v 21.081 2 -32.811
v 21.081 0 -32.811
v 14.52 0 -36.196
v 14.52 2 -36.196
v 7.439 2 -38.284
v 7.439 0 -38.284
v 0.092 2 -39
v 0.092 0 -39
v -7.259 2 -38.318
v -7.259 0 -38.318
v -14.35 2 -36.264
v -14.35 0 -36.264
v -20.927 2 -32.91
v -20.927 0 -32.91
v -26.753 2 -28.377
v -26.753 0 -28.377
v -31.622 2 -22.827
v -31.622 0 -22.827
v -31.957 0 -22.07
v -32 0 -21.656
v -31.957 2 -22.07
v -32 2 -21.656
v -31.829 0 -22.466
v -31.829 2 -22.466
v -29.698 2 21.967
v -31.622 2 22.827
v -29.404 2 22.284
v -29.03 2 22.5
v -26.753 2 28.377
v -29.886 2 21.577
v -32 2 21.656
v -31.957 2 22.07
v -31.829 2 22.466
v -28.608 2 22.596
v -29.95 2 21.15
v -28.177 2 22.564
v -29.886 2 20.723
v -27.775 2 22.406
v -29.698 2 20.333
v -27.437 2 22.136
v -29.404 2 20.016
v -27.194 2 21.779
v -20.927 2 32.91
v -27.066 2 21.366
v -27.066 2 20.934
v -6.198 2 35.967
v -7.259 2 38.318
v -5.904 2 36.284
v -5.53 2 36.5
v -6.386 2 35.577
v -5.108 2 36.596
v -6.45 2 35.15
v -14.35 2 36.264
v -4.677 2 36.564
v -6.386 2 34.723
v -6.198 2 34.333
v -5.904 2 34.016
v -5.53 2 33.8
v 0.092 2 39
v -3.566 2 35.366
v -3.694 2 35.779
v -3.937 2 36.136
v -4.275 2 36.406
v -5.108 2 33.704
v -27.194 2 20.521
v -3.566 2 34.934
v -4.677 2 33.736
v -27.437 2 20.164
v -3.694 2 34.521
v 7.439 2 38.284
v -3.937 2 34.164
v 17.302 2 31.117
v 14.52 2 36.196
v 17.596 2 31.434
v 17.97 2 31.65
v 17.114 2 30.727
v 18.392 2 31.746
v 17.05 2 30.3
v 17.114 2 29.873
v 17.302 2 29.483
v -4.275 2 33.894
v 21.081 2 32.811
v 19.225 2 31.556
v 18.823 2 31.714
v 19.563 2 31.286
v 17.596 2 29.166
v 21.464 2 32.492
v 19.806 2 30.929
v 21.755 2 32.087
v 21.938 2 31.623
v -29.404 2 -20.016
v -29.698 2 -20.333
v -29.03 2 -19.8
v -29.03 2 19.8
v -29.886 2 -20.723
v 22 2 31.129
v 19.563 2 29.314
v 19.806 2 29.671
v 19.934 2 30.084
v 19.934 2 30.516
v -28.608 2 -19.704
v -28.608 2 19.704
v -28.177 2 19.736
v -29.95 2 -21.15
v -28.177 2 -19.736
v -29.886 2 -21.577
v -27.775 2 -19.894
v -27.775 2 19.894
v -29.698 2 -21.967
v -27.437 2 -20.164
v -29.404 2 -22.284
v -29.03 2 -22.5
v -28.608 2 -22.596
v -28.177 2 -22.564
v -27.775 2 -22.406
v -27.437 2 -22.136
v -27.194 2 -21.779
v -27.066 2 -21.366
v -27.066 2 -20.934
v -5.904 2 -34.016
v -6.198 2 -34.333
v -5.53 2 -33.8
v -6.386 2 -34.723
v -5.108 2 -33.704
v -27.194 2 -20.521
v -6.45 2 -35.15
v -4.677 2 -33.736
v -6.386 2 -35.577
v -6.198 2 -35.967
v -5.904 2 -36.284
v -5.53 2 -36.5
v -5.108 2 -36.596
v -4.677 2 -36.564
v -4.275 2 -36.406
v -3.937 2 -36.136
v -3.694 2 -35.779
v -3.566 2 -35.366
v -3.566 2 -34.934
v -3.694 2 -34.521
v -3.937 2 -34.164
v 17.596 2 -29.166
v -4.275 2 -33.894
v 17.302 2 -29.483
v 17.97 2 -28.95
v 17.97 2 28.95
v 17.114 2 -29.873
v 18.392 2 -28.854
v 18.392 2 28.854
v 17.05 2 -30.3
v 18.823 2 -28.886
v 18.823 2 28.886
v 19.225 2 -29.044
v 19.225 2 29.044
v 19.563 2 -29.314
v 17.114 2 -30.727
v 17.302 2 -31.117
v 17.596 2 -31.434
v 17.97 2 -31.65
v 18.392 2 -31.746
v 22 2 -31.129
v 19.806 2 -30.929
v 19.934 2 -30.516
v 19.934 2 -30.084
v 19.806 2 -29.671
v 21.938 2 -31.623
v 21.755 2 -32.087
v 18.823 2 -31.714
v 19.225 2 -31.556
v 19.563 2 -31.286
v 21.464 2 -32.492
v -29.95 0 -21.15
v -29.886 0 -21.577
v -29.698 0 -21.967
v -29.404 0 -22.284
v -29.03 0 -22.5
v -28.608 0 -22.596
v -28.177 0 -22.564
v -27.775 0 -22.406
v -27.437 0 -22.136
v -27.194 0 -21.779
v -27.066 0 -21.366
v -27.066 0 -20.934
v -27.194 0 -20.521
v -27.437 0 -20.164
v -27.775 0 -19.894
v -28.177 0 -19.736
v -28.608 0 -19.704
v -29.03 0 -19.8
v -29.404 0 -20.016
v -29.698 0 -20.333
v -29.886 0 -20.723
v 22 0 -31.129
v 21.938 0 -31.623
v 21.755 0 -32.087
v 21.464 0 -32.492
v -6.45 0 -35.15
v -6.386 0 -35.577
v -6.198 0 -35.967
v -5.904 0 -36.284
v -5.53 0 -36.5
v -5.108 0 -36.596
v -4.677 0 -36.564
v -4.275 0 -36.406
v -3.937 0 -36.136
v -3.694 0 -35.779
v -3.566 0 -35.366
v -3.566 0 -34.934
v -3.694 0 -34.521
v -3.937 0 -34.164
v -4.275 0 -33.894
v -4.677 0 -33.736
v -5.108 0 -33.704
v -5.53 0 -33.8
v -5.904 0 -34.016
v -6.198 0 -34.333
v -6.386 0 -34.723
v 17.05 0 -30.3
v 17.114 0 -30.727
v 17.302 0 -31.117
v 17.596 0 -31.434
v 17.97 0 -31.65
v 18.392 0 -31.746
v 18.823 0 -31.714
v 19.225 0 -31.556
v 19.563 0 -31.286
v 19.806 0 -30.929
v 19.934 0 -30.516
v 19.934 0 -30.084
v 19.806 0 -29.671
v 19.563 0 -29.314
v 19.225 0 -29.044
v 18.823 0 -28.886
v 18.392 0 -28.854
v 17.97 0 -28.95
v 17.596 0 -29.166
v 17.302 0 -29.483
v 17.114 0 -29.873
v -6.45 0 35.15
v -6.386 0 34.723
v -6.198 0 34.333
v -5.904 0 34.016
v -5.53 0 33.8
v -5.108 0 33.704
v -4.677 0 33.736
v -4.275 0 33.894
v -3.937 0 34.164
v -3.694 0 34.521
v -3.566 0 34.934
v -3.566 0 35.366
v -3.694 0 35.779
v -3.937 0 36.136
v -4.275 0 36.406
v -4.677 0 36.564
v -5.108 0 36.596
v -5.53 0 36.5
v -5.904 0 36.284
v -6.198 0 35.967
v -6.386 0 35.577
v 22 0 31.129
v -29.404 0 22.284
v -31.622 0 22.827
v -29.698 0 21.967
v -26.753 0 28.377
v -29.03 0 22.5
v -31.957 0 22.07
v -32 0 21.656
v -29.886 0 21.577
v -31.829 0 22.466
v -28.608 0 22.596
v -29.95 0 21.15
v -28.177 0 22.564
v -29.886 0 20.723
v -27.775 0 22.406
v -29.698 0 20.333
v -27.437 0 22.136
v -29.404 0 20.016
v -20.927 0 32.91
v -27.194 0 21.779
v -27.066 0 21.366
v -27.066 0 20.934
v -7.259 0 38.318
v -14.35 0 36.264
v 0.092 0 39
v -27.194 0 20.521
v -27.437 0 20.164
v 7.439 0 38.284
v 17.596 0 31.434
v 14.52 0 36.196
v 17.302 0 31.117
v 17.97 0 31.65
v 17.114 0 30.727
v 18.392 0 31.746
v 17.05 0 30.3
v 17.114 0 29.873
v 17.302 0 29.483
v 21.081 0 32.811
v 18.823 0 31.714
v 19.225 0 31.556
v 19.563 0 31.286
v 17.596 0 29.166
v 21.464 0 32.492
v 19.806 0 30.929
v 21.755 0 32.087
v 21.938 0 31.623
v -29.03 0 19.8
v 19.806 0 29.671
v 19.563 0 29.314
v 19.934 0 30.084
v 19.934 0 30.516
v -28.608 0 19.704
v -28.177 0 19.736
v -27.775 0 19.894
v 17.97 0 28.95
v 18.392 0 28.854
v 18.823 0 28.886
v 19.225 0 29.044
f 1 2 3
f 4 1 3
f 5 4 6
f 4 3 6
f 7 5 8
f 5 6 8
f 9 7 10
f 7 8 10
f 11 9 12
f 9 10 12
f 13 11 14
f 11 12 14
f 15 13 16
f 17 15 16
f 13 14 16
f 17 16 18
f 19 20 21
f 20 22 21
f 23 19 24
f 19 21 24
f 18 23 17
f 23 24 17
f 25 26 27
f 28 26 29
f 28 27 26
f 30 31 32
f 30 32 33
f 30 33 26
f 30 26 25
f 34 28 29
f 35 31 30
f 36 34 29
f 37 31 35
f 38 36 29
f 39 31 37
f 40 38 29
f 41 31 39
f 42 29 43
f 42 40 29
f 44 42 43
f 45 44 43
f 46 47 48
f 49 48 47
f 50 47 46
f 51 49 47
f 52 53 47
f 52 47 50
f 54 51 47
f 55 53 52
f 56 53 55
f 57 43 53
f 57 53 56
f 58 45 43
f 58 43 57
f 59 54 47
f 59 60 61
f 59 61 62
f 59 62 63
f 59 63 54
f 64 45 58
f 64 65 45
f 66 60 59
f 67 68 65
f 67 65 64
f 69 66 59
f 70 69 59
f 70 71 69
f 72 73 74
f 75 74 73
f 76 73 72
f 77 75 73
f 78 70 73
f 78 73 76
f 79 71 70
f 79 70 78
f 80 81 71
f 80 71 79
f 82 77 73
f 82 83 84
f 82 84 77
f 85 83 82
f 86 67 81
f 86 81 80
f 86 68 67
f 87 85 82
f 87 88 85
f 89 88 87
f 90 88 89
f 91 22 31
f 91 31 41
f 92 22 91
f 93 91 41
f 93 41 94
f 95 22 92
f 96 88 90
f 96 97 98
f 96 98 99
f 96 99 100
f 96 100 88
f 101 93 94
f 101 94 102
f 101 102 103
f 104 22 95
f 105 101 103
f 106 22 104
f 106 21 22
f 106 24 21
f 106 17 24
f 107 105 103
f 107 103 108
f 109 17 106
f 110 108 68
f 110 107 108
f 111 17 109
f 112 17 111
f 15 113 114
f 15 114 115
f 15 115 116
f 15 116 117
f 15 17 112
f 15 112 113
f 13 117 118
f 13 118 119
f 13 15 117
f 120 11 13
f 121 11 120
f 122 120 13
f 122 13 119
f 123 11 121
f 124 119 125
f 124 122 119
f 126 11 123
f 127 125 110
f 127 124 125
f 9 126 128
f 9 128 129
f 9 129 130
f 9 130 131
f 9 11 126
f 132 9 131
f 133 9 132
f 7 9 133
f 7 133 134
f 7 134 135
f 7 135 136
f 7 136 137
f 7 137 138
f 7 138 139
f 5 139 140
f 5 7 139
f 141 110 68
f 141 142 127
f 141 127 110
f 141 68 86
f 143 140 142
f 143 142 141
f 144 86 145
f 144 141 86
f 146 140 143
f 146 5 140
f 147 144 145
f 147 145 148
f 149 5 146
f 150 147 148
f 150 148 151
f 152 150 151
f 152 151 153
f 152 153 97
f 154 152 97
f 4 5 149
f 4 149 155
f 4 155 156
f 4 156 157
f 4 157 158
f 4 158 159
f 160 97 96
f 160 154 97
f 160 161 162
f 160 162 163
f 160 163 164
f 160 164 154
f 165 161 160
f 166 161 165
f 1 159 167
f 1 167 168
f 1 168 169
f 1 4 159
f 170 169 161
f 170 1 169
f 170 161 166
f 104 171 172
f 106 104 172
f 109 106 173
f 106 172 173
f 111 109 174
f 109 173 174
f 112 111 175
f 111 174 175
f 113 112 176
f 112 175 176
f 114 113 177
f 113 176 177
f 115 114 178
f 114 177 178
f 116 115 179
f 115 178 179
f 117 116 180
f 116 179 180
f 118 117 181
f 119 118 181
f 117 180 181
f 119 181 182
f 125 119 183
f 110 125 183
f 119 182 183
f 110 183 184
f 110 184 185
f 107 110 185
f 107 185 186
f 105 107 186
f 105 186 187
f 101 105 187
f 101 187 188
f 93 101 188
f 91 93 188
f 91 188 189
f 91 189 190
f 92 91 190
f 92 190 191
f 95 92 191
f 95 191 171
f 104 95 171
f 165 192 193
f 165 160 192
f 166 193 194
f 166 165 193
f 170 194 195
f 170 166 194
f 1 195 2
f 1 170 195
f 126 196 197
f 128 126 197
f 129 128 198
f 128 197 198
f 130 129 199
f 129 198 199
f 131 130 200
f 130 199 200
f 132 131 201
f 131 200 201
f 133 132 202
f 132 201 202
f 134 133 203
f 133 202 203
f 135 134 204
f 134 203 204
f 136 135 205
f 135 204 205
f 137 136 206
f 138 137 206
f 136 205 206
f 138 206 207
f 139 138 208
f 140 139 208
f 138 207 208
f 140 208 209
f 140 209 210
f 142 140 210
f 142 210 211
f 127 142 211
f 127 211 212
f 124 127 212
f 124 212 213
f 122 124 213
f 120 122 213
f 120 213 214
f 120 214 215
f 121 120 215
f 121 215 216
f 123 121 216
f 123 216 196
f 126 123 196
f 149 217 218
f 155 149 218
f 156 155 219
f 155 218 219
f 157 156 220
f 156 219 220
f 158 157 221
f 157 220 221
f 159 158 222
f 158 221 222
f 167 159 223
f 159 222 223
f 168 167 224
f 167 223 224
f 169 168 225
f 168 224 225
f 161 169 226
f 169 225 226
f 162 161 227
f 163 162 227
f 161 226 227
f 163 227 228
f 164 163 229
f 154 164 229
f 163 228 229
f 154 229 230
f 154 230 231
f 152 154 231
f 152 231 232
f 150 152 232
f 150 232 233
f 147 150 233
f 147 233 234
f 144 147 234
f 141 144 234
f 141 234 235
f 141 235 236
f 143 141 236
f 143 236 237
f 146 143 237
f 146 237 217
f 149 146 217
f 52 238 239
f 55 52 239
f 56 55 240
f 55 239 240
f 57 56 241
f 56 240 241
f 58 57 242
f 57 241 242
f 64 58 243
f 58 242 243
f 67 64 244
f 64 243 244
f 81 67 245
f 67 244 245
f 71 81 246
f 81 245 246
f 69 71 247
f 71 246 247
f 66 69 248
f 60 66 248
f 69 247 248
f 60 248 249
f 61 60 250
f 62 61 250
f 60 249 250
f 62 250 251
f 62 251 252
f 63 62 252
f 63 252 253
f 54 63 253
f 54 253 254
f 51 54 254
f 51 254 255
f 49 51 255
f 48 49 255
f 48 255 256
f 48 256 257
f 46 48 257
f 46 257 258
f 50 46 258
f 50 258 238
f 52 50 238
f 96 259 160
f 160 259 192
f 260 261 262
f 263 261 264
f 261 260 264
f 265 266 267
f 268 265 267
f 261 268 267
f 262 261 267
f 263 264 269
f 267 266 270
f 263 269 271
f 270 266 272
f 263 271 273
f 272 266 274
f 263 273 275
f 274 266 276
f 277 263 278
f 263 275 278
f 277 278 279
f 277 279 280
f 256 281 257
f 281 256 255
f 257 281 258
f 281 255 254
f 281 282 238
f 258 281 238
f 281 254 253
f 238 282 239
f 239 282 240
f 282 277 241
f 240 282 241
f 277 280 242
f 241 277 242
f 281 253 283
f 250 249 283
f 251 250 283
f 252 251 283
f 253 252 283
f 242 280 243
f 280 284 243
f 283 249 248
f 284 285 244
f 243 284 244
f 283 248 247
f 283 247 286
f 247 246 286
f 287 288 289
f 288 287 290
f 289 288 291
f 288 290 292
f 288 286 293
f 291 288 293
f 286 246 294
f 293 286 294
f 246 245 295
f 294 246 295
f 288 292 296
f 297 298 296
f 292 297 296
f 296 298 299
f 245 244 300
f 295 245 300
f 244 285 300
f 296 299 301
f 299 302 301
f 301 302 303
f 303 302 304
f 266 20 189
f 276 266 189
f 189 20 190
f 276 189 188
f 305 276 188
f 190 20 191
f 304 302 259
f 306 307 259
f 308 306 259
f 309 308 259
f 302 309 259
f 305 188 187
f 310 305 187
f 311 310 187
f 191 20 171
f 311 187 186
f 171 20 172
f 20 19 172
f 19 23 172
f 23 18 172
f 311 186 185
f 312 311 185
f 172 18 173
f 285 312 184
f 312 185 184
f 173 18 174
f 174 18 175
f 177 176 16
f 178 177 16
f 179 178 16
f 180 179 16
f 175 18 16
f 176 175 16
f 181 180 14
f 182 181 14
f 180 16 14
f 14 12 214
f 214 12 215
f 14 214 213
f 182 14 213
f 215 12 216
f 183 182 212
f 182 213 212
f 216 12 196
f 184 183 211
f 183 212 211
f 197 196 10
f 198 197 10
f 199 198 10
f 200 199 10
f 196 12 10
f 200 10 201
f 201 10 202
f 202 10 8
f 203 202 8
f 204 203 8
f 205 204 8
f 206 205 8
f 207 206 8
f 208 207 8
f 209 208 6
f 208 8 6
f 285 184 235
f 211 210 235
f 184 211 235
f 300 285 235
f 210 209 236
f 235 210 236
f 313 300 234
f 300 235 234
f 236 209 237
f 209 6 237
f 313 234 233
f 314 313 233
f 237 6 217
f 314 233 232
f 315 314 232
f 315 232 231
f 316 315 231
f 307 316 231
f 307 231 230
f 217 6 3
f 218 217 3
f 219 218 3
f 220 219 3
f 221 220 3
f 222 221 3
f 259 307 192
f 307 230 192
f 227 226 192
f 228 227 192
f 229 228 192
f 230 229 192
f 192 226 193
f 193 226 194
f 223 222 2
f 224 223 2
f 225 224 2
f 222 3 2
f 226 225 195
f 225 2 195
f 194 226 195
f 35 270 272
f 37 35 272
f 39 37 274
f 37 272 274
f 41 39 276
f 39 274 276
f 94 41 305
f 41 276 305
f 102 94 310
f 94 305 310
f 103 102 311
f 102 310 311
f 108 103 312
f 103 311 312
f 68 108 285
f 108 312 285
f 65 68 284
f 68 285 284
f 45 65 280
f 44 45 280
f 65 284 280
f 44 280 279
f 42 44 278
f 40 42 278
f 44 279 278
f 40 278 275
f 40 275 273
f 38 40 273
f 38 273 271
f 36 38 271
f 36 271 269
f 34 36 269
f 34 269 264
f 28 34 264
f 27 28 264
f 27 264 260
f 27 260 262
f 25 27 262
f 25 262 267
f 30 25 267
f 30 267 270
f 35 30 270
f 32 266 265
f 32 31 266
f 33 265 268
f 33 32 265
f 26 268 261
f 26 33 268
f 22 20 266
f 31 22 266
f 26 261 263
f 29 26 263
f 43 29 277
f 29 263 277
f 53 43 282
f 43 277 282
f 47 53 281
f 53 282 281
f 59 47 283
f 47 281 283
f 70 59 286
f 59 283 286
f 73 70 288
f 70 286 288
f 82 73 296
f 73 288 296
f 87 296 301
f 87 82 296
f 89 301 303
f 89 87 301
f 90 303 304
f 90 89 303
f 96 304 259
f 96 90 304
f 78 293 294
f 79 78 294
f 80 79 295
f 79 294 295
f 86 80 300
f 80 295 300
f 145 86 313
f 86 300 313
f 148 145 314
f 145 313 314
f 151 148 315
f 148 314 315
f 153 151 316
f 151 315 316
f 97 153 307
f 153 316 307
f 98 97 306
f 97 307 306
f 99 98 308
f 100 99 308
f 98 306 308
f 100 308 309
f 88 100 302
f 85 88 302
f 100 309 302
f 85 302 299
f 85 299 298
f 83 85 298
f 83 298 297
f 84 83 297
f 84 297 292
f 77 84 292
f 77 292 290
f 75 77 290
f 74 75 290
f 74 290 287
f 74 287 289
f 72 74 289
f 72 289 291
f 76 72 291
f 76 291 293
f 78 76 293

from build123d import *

# Parameters (mm, degrees)
BOSS_EXTRUDE1_DEPTH        = 2
FILLET1_R                  = 2
F_2_9_2_9_DIAMETER_HOLE1_D = 2.9


with BuildPart() as part:
    # Sketch1 → Boss-Extrude1 (new body)
    with BuildSketch(Plane(origin=(0, 0, 0), x_dir=(1, 0, 0), z_dir=(0, 1, 0))):
        with BuildLine():
            Line((-32, 22.29349681), (-32, -22.29349681))
            ThreePointArc((-32, -22.29349681), (-7.038963606, -38.359522825), (22, -32.202484376))
            Line((22, -32.202484376), (22, 32.202484376))
            ThreePointArc((22, 32.202484376), (-7.038963606, 38.359522825), (-32, 22.29349681))
        make_face()
    extrude(amount=BOSS_EXTRUDE1_DEPTH)

    # Fillet1
    fillet1_edges = [part.edges().sort_by_distance(p)[0] for p in [
        (22, 1, -32.202484376),
        (22, 1, 32.202484376),
        (-32, 1, 22.29349681),
        (-32, 1, -22.29349681),
    ]]
    fillet(fillet1_edges, radius=FILLET1_R)

    # Ø2.9 (2.9) Diameter Hole1 (through all)
    with Locations(Plane(origin=(0, 2, 0), x_dir=(1, 0, 0), z_dir=(0, 1, 0))):
        with Locations((-28.5, 21.15), (-28.5, -21.15), (18.5, -30.3), (18.5, 30.3), (-5, 35.15), (-5, -35.15)):
            Hole(F_2_9_2_9_DIAMETER_HOLE1_D / 2)


solid = part.part
